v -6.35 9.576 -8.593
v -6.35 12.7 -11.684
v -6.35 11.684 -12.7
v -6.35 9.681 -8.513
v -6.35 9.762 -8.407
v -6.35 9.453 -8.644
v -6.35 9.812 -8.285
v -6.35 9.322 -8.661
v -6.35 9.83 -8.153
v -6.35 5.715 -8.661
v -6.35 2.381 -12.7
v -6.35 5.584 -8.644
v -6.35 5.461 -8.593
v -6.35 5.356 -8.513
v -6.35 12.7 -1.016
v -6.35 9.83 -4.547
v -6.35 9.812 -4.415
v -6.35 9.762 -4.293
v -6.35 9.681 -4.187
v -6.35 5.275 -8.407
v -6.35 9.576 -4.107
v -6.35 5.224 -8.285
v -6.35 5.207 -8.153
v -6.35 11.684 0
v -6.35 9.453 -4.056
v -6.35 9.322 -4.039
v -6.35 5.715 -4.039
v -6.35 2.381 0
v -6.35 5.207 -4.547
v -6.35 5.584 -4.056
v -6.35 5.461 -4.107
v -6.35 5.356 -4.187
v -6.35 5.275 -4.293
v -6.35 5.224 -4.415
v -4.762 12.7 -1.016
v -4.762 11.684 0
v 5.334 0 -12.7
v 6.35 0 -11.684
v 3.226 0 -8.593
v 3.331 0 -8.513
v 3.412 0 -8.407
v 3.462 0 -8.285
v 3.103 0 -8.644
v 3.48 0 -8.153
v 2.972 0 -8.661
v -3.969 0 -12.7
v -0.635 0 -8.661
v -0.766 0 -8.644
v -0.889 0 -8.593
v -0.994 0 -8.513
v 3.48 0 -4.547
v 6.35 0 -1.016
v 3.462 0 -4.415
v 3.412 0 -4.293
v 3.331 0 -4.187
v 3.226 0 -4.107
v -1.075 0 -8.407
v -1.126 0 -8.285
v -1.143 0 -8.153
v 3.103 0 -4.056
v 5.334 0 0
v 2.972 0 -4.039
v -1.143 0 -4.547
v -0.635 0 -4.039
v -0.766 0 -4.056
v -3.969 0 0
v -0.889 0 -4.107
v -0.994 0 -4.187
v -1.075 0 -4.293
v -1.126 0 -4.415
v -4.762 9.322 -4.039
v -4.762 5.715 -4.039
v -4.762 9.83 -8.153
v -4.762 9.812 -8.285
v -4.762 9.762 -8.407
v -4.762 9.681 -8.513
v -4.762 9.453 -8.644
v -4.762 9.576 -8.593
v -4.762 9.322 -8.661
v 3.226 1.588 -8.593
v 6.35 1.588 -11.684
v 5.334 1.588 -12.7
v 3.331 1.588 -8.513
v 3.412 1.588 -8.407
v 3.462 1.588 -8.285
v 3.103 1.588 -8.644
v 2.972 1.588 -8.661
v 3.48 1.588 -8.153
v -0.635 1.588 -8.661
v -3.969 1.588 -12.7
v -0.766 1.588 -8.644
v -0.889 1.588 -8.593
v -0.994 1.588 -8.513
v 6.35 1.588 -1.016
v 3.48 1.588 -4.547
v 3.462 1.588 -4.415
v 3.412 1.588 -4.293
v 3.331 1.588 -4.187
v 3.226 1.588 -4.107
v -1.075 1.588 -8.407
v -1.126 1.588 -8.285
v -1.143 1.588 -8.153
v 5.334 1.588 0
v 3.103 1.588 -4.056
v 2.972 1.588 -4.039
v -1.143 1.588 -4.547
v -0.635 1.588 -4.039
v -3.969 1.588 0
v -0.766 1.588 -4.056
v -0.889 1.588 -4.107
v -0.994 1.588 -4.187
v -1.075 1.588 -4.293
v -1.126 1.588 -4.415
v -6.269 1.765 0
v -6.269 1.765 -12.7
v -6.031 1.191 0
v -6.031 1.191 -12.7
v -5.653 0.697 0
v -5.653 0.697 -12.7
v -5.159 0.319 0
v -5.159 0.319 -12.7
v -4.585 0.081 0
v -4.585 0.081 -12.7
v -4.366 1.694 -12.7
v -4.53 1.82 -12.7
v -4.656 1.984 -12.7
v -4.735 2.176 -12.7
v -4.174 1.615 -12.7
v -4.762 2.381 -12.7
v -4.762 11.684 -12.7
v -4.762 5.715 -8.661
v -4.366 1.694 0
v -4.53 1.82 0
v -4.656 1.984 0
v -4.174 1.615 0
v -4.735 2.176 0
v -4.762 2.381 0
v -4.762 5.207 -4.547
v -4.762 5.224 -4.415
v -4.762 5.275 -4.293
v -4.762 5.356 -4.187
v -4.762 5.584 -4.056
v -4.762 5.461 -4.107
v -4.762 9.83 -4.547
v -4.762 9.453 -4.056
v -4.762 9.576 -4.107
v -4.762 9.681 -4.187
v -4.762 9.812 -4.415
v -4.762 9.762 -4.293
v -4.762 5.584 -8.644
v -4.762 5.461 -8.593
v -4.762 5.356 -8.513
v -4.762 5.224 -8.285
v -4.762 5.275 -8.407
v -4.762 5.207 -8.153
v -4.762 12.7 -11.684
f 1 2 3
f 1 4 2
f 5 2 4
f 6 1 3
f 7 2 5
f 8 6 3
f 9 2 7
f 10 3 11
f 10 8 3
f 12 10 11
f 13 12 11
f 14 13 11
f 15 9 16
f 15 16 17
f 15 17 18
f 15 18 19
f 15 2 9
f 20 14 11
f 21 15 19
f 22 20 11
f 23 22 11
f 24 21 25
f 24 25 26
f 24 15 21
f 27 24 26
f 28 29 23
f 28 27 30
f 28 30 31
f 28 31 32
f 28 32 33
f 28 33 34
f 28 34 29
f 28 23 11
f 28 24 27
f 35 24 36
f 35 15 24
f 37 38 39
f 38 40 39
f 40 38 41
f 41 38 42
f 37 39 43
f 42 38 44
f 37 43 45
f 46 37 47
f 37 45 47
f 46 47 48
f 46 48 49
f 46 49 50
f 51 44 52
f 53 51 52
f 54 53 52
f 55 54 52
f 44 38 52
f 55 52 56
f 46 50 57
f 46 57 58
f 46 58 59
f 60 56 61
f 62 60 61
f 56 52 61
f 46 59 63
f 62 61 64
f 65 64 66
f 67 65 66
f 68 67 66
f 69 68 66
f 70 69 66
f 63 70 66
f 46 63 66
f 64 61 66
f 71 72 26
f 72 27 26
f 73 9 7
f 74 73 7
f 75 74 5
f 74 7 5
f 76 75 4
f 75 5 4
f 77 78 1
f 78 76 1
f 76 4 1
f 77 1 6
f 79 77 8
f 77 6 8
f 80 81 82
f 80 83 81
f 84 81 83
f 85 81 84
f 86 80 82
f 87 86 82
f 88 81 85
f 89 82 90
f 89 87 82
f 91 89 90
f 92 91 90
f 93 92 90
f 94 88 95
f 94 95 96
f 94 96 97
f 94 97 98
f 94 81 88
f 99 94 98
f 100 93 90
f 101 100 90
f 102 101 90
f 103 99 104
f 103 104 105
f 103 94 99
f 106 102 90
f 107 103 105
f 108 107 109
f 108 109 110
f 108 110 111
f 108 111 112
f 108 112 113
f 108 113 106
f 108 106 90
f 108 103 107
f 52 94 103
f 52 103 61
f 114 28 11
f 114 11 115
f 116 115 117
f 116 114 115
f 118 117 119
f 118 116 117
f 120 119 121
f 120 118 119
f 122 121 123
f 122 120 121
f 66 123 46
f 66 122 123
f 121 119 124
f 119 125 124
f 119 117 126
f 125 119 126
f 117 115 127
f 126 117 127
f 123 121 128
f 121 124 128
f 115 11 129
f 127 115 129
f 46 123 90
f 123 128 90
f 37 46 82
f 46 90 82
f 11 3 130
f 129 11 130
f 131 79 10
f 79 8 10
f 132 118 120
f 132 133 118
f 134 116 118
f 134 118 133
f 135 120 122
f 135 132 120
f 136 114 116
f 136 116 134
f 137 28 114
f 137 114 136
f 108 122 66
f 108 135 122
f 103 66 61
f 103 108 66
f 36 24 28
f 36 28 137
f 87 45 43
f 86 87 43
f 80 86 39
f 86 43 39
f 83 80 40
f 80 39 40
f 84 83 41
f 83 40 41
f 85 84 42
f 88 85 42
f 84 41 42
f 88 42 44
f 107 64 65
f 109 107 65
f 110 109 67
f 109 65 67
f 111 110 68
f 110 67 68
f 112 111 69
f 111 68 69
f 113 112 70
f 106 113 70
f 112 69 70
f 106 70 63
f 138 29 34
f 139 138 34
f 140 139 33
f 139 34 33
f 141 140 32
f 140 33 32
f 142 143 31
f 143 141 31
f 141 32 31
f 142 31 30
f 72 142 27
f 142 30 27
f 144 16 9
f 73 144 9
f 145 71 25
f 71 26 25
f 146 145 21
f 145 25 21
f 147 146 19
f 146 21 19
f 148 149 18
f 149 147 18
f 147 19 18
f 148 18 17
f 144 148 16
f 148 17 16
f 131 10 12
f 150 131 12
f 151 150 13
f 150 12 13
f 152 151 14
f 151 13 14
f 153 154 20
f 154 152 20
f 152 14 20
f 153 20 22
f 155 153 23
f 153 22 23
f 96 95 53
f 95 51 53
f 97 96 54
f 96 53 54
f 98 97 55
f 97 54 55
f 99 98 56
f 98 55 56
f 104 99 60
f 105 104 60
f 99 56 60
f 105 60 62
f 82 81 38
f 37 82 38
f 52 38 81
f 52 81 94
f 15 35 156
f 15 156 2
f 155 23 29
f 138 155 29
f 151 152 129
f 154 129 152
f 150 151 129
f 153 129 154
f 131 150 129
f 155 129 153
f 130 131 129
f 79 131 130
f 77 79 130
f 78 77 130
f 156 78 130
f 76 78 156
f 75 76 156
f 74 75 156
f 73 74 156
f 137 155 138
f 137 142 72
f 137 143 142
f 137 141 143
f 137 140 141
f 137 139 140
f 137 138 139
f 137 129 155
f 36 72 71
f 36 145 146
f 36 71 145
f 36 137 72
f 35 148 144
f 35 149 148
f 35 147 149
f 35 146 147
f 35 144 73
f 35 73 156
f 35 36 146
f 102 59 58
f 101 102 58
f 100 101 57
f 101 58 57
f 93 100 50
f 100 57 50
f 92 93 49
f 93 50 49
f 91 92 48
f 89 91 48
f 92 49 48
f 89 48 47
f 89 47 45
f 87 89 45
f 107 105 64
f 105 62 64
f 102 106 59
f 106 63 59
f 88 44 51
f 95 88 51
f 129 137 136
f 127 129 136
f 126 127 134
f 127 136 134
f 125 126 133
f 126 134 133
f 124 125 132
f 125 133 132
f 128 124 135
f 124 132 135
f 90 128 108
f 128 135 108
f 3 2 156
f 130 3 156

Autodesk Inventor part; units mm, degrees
ref_plane "YZ Plane" through (0, 0, 0) normal (1, 0, 0) x (0, 1, 0)
ref_plane "XZ Plane" through (0, 0, 0) normal (0, 1, 0) x (-1, 0, 0)
sketch "Sketch1" plane through (0, 0, 0) normal (0, 1, 0) x (-1, 0, 0)
  line L0 (-6.35, 0) -> (6.35, 0)
  line L1 (6.35, 0) -> (6.35, -12.7)
  line L2 (6.35, -12.7) -> (-6.35, -12.7)
  line L3 (-6.35, -12.7) -> (-6.35, 0)
  line L4 (6.35, 0) -> (-6.35, -12.7) construction
  point P0 (0, 0)
  point P1 (0, 0)
  dimension "d0" = 12.7
  dimension "d1" = 12.7
extrude "Plate1" add sketch "Sketch1" along normal blind 1.5875
sketch "Sketch2" plane through (-4.7625, 0, 0) normal (-1, 0, 0) x (0, -1, 0)
  line L0 (0, -12.7) -> (0, 0)
  line L1 (0, 0) -> (-12.7, 0)
  line L2 (-12.7, 0) -> (-12.7, -12.7)
  line L3 (-12.7, -12.7) -> (0, -12.7)
edge flange "Flanges" height 12.7 angle 90 thickness 1.5875 bend radius 0.7937 thickness toward (-1, 0, 0) relief tear relief width 1.5875 relief depth 0.7937 edges at (-6.35, 1.5875, -6.35) wall of the first edge with corners at (-4.7625, 0, -12.7) (-4.7625, 0, 0) (-4.7625, 12.7, 0) (-4.7625, 12.7, -12.7)
bend "Bend1"
corner "Corner1"
sketch "Sketch8" plane through (0, 0, 0) normal (0, -1, 0) x (1, 0, 0)
  line L0 (6.35, 0) -> (-3.9687, 0) construction
  line L1 (2.9718, -4.0386) -> (-0.635, -4.0386)
  line L2 (-1.143, -4.5466) -> (-1.143, -8.1534)
  line L3 (-0.635, -8.6614) -> (2.9718, -8.6614)
  line L4 (3.4798, -8.1534) -> (3.4798, -4.5466)
  arc A0 (3.4798, -4.5466) -> (2.9718, -4.0386) centre (2.9718, -4.5466) ccw
  arc A1 (2.9718, -8.6614) -> (3.4798, -8.1534) centre (2.9718, -8.1534) ccw
  arc A2 (-1.143, -8.1534) -> (-0.635, -8.6614) centre (-0.635, -8.1534) ccw
  arc A3 (-0.635, -4.0386) -> (-1.143, -4.5466) centre (-0.635, -4.5466) ccw
  line L5 (2.9718, -4.5466) -> (-0.635, -8.1534) construction
  line L6 (6.35, -12.7) -> (6.35, 0) construction
  point P0 (0, 0)
  point P1 (-1.143, -8.6614)
  point P2 (3.4798, -8.6614)
  point P3 (12.7, 0)
  point P4 (1.1684, -6.35)
  dimension "d49" = 4.6228
  dimension "d50" = 0.508
  dimension "d52" = 6.35
  dimension "d123" = 5.1816
extrude "Body Stamp" cut sketch "Sketch8" against normal blind 1.5875
sketch "Sketch9" plane through (0, 0, 0) normal (0, -1, 0) x (1, 0, 0)
  arc A0 (3.4798, -4.5466) -> (2.9718, -4.0386) centre (2.9718, -4.5466) ccw construction
  arc A1 (-1.143, -8.1534) -> (-0.635, -8.6614) centre (-0.635, -8.1534) ccw construction
  line L0 (2.9718, -4.5466) -> (-0.635, -8.1534) construction
  circle A2 centre (1.1684, -6.35) radius 2.1844
  point P0 (0, 0)
  dimension "d55" = 4.3688
surface extrude "Body Circle" sketch "Sketch9" against normal up to surface (1.5875 mm away) shown yes curves A2
pattern_sketch "Body Pattern" of "Body Stamp", "Body Circle" from (1.1684, 0, -6.35) copies at (1.1684, 0, -19.05) at (1.1684, 0, -31.75) at (1.1684, 0, -44.45) at (1.1684, 0, -57.15) at (1.1684, 0, -69.85) at (1.1684, 0, -82.55) at (1.1684, 0, -95.25) at (1.1684, 0, -107.95) at (1.1684, 0, -120.65) at (1.1684, 0, -133.35) at (1.1684, 0, -146.05) at (1.1684, 0, -158.75) at (1.1684, 0, -171.45) at (1.1684, 0, -184.15) at (1.1684, 0, -196.85) at (1.1684, 0, -209.55) at (1.1684, 0, -222.25) at (1.1684, 0, -234.95) at (1.1684, 0, -247.65) at (1.1684, 0, -260.35) at (1.1684, 0, -273.05) at (1.1684, 0, -285.75) at (1.1684, 0, -298.45) at (1.1684, 0, -311.15) at (1.1684, 0, -323.85) at (1.1684, 0, -336.55) at (1.1684, 0, -349.25) at (1.1684, 0, -361.95) at (1.1684, 0, -374.65) at (1.1684, 0, -387.35) at (1.1684, 0, -400.05) at (1.1684, 0, -412.75) at (1.1684, 0, -425.45) at (1.1684, 0, -438.15)
sketch "Arc Length" plane through (19.05, 2.3812, 0) normal (0, 0, 1) x (1, 0, 0)
  line L0 (-25.4, 0) -> (-23.8125, 0) projected
  arc A0 (-25.4, 0) -> (-23.0187, -2.3813) centre (-23.0187, 0) ccw projected
  line L1 (-23.0187, -0.7938) -> (-23.0187, -2.3813) projected
  arc A1 (-23.8125, 0) -> (-23.0187, -0.7938) centre (-23.0187, 0) ccw projected
  point P0 (-19.05, -2.3812)
  dimension "d126" = 1.2468
  dimension "d127" = 3.7405
feature "Notch" [suppressed]
pattern_linear "Notch Pattern" [suppressed]
ref_plane "Diagonal Plane" through (-4.7625, 1.5875, 0) normal (-0.7071068, 0.7071068, 0) x (0, 0, 1)
mirror "Everything Mirrored" about plane through (-4.7625, 1.5875, 0) normal (-0.7071068, 0.7071068, 0) of "Body Stamp", "Body Circle", "Body Pattern"
chamfer "End Chamfer" distance 1.016 angle 45 4 edges at (-5.5562, 12.7, -12.7) (-5.5562, 12.7, 0) (6.35, 0.7937, 0) (6.35, 0.7937, -12.7)
sketch "Body Pattern Sketch" plane through (0, 0, 0) normal (0, -1, 0) x (1, 0, 0)
  line L0 (1.1684, -6.35) -> (1.1684, 0) construction
  circle A0 centre (1.1684, -6.35) radius 2.1844 construction
  point P0 (1.1684, -19.05)
  point P1 (1.1684, -31.75)
  point P2 (1.1684, -44.45)
  point P3 (1.1684, -57.15)
  point P4 (1.1684, -69.85)
  point P5 (1.1684, -82.55)
  point P6 (1.1684, -95.25)
  point P7 (1.1684, -107.95)
  point P8 (1.1684, -120.65)
  point P9 (1.1684, -133.35)
  point P10 (1.1684, -146.05)
  point P11 (1.1684, -158.75)
  point P12 (1.1684, -171.45)
  point P13 (1.1684, -184.15)
  point P14 (1.1684, -196.85)
  point P15 (1.1684, -209.55)
  point P16 (1.1684, -222.25)
  point P17 (1.1684, -234.95)
  point P18 (1.1684, -247.65)
  point P19 (1.1684, -260.35)
  point P20 (1.1684, -273.05)
  point P21 (1.1684, -285.75)
  point P22 (1.1684, -298.45)
  point P23 (1.1684, -311.15)
  point P24 (1.1684, -323.85)
  point P25 (1.1684, -336.55)
  point P26 (1.1684, -349.25)
  point P27 (1.1684, -361.95)
  point P28 (1.1684, -374.65)
  point P29 (1.1684, -387.35)
  point P30 (1.1684, -400.05)
  point P31 (1.1684, -412.75)
  point P32 (1.1684, -425.45)
  point P33 (1.1684, -438.15)
  dimension "d133" = 12.7
sketch "Sketch13" plane through (-6.35, 0, 431.8) normal (1, 0, 0) x (0, 0, -1)
  line L0 (493.268, 12.7) -> (495.3, 10.668)
  line L1 (495.3, 10.668) -> (497.332, 12.7)
  line L2 (493.268, 12.7) -> (497.332, 12.7)
  line L3 (495.3, 3.3973) -> (493.0372, 1.1344)
  line L4 (493.0372, 1.1344) -> (495.3, -1.1284)
  line L5 (495.3, -1.1284) -> (497.5628, 1.1344)
  line L6 (497.5628, 1.1344) -> (495.3, 3.3973)
  line L7 (495.3, 3.3973) -> (495.3, -1.1284) construction
  line L8 (495.3, 10.668) -> (495.3, 3.3973) construction
  line L9 (444.5, 12.7) -> (431.8, 12.7) projected
  line L10 (444.5, 2.3813) -> (431.8, 2.3813) construction
  line L11 (431.8, 12.7) -> (431.8, 2.3813) construction
  point P0 (444.5, -11.9062)
  point P1 (431.8, 0)
  dimension "d86" = 4.5256
  dimension "d128" = 2.032
  dimension "d129" = 1.016
  dimension "d130" = 63.5
equation "\"d53\" = Thickness"
equation "\"d89\" = Thickness"
equation "\"d1\" = 12.7 * Length"
equation "\"d2\" = Thickness"
equation "\"d3\" = BendReliefWidth"
equation "\"d4\" = BendReliefDepth"
equation "\"d5\" = MinimumRemnant"
equation "\"d6\" = TransitionRadius"
equation "\"d10\" = CornerReliefSize"
equation "\"d11\" = GapSize"
equation "\"d12\" = JacobiRadiusSize"
equation "\"BendRadius\" = Thickness"
equation "\"BendReliefWidth\" = Thickness"
equation "\"BendReliefDepth\" = 0.5 * Thickness"
equation "\"CornerReliefSize\" = 4 * Thickness"
equation "\"MinimumRemnant\" = 2 * Thickness"
equation "\"TransitionRadius\" = BendRadius"
equation "\"JacobiRadiusSize\" = BendRadius"
equation "\"GapSize\" = Thickness"
equation "\"Thickness\" = 1.5875"
equation "\"Length\" = 1"
properties part number "Alu C 1x2x1x35"
